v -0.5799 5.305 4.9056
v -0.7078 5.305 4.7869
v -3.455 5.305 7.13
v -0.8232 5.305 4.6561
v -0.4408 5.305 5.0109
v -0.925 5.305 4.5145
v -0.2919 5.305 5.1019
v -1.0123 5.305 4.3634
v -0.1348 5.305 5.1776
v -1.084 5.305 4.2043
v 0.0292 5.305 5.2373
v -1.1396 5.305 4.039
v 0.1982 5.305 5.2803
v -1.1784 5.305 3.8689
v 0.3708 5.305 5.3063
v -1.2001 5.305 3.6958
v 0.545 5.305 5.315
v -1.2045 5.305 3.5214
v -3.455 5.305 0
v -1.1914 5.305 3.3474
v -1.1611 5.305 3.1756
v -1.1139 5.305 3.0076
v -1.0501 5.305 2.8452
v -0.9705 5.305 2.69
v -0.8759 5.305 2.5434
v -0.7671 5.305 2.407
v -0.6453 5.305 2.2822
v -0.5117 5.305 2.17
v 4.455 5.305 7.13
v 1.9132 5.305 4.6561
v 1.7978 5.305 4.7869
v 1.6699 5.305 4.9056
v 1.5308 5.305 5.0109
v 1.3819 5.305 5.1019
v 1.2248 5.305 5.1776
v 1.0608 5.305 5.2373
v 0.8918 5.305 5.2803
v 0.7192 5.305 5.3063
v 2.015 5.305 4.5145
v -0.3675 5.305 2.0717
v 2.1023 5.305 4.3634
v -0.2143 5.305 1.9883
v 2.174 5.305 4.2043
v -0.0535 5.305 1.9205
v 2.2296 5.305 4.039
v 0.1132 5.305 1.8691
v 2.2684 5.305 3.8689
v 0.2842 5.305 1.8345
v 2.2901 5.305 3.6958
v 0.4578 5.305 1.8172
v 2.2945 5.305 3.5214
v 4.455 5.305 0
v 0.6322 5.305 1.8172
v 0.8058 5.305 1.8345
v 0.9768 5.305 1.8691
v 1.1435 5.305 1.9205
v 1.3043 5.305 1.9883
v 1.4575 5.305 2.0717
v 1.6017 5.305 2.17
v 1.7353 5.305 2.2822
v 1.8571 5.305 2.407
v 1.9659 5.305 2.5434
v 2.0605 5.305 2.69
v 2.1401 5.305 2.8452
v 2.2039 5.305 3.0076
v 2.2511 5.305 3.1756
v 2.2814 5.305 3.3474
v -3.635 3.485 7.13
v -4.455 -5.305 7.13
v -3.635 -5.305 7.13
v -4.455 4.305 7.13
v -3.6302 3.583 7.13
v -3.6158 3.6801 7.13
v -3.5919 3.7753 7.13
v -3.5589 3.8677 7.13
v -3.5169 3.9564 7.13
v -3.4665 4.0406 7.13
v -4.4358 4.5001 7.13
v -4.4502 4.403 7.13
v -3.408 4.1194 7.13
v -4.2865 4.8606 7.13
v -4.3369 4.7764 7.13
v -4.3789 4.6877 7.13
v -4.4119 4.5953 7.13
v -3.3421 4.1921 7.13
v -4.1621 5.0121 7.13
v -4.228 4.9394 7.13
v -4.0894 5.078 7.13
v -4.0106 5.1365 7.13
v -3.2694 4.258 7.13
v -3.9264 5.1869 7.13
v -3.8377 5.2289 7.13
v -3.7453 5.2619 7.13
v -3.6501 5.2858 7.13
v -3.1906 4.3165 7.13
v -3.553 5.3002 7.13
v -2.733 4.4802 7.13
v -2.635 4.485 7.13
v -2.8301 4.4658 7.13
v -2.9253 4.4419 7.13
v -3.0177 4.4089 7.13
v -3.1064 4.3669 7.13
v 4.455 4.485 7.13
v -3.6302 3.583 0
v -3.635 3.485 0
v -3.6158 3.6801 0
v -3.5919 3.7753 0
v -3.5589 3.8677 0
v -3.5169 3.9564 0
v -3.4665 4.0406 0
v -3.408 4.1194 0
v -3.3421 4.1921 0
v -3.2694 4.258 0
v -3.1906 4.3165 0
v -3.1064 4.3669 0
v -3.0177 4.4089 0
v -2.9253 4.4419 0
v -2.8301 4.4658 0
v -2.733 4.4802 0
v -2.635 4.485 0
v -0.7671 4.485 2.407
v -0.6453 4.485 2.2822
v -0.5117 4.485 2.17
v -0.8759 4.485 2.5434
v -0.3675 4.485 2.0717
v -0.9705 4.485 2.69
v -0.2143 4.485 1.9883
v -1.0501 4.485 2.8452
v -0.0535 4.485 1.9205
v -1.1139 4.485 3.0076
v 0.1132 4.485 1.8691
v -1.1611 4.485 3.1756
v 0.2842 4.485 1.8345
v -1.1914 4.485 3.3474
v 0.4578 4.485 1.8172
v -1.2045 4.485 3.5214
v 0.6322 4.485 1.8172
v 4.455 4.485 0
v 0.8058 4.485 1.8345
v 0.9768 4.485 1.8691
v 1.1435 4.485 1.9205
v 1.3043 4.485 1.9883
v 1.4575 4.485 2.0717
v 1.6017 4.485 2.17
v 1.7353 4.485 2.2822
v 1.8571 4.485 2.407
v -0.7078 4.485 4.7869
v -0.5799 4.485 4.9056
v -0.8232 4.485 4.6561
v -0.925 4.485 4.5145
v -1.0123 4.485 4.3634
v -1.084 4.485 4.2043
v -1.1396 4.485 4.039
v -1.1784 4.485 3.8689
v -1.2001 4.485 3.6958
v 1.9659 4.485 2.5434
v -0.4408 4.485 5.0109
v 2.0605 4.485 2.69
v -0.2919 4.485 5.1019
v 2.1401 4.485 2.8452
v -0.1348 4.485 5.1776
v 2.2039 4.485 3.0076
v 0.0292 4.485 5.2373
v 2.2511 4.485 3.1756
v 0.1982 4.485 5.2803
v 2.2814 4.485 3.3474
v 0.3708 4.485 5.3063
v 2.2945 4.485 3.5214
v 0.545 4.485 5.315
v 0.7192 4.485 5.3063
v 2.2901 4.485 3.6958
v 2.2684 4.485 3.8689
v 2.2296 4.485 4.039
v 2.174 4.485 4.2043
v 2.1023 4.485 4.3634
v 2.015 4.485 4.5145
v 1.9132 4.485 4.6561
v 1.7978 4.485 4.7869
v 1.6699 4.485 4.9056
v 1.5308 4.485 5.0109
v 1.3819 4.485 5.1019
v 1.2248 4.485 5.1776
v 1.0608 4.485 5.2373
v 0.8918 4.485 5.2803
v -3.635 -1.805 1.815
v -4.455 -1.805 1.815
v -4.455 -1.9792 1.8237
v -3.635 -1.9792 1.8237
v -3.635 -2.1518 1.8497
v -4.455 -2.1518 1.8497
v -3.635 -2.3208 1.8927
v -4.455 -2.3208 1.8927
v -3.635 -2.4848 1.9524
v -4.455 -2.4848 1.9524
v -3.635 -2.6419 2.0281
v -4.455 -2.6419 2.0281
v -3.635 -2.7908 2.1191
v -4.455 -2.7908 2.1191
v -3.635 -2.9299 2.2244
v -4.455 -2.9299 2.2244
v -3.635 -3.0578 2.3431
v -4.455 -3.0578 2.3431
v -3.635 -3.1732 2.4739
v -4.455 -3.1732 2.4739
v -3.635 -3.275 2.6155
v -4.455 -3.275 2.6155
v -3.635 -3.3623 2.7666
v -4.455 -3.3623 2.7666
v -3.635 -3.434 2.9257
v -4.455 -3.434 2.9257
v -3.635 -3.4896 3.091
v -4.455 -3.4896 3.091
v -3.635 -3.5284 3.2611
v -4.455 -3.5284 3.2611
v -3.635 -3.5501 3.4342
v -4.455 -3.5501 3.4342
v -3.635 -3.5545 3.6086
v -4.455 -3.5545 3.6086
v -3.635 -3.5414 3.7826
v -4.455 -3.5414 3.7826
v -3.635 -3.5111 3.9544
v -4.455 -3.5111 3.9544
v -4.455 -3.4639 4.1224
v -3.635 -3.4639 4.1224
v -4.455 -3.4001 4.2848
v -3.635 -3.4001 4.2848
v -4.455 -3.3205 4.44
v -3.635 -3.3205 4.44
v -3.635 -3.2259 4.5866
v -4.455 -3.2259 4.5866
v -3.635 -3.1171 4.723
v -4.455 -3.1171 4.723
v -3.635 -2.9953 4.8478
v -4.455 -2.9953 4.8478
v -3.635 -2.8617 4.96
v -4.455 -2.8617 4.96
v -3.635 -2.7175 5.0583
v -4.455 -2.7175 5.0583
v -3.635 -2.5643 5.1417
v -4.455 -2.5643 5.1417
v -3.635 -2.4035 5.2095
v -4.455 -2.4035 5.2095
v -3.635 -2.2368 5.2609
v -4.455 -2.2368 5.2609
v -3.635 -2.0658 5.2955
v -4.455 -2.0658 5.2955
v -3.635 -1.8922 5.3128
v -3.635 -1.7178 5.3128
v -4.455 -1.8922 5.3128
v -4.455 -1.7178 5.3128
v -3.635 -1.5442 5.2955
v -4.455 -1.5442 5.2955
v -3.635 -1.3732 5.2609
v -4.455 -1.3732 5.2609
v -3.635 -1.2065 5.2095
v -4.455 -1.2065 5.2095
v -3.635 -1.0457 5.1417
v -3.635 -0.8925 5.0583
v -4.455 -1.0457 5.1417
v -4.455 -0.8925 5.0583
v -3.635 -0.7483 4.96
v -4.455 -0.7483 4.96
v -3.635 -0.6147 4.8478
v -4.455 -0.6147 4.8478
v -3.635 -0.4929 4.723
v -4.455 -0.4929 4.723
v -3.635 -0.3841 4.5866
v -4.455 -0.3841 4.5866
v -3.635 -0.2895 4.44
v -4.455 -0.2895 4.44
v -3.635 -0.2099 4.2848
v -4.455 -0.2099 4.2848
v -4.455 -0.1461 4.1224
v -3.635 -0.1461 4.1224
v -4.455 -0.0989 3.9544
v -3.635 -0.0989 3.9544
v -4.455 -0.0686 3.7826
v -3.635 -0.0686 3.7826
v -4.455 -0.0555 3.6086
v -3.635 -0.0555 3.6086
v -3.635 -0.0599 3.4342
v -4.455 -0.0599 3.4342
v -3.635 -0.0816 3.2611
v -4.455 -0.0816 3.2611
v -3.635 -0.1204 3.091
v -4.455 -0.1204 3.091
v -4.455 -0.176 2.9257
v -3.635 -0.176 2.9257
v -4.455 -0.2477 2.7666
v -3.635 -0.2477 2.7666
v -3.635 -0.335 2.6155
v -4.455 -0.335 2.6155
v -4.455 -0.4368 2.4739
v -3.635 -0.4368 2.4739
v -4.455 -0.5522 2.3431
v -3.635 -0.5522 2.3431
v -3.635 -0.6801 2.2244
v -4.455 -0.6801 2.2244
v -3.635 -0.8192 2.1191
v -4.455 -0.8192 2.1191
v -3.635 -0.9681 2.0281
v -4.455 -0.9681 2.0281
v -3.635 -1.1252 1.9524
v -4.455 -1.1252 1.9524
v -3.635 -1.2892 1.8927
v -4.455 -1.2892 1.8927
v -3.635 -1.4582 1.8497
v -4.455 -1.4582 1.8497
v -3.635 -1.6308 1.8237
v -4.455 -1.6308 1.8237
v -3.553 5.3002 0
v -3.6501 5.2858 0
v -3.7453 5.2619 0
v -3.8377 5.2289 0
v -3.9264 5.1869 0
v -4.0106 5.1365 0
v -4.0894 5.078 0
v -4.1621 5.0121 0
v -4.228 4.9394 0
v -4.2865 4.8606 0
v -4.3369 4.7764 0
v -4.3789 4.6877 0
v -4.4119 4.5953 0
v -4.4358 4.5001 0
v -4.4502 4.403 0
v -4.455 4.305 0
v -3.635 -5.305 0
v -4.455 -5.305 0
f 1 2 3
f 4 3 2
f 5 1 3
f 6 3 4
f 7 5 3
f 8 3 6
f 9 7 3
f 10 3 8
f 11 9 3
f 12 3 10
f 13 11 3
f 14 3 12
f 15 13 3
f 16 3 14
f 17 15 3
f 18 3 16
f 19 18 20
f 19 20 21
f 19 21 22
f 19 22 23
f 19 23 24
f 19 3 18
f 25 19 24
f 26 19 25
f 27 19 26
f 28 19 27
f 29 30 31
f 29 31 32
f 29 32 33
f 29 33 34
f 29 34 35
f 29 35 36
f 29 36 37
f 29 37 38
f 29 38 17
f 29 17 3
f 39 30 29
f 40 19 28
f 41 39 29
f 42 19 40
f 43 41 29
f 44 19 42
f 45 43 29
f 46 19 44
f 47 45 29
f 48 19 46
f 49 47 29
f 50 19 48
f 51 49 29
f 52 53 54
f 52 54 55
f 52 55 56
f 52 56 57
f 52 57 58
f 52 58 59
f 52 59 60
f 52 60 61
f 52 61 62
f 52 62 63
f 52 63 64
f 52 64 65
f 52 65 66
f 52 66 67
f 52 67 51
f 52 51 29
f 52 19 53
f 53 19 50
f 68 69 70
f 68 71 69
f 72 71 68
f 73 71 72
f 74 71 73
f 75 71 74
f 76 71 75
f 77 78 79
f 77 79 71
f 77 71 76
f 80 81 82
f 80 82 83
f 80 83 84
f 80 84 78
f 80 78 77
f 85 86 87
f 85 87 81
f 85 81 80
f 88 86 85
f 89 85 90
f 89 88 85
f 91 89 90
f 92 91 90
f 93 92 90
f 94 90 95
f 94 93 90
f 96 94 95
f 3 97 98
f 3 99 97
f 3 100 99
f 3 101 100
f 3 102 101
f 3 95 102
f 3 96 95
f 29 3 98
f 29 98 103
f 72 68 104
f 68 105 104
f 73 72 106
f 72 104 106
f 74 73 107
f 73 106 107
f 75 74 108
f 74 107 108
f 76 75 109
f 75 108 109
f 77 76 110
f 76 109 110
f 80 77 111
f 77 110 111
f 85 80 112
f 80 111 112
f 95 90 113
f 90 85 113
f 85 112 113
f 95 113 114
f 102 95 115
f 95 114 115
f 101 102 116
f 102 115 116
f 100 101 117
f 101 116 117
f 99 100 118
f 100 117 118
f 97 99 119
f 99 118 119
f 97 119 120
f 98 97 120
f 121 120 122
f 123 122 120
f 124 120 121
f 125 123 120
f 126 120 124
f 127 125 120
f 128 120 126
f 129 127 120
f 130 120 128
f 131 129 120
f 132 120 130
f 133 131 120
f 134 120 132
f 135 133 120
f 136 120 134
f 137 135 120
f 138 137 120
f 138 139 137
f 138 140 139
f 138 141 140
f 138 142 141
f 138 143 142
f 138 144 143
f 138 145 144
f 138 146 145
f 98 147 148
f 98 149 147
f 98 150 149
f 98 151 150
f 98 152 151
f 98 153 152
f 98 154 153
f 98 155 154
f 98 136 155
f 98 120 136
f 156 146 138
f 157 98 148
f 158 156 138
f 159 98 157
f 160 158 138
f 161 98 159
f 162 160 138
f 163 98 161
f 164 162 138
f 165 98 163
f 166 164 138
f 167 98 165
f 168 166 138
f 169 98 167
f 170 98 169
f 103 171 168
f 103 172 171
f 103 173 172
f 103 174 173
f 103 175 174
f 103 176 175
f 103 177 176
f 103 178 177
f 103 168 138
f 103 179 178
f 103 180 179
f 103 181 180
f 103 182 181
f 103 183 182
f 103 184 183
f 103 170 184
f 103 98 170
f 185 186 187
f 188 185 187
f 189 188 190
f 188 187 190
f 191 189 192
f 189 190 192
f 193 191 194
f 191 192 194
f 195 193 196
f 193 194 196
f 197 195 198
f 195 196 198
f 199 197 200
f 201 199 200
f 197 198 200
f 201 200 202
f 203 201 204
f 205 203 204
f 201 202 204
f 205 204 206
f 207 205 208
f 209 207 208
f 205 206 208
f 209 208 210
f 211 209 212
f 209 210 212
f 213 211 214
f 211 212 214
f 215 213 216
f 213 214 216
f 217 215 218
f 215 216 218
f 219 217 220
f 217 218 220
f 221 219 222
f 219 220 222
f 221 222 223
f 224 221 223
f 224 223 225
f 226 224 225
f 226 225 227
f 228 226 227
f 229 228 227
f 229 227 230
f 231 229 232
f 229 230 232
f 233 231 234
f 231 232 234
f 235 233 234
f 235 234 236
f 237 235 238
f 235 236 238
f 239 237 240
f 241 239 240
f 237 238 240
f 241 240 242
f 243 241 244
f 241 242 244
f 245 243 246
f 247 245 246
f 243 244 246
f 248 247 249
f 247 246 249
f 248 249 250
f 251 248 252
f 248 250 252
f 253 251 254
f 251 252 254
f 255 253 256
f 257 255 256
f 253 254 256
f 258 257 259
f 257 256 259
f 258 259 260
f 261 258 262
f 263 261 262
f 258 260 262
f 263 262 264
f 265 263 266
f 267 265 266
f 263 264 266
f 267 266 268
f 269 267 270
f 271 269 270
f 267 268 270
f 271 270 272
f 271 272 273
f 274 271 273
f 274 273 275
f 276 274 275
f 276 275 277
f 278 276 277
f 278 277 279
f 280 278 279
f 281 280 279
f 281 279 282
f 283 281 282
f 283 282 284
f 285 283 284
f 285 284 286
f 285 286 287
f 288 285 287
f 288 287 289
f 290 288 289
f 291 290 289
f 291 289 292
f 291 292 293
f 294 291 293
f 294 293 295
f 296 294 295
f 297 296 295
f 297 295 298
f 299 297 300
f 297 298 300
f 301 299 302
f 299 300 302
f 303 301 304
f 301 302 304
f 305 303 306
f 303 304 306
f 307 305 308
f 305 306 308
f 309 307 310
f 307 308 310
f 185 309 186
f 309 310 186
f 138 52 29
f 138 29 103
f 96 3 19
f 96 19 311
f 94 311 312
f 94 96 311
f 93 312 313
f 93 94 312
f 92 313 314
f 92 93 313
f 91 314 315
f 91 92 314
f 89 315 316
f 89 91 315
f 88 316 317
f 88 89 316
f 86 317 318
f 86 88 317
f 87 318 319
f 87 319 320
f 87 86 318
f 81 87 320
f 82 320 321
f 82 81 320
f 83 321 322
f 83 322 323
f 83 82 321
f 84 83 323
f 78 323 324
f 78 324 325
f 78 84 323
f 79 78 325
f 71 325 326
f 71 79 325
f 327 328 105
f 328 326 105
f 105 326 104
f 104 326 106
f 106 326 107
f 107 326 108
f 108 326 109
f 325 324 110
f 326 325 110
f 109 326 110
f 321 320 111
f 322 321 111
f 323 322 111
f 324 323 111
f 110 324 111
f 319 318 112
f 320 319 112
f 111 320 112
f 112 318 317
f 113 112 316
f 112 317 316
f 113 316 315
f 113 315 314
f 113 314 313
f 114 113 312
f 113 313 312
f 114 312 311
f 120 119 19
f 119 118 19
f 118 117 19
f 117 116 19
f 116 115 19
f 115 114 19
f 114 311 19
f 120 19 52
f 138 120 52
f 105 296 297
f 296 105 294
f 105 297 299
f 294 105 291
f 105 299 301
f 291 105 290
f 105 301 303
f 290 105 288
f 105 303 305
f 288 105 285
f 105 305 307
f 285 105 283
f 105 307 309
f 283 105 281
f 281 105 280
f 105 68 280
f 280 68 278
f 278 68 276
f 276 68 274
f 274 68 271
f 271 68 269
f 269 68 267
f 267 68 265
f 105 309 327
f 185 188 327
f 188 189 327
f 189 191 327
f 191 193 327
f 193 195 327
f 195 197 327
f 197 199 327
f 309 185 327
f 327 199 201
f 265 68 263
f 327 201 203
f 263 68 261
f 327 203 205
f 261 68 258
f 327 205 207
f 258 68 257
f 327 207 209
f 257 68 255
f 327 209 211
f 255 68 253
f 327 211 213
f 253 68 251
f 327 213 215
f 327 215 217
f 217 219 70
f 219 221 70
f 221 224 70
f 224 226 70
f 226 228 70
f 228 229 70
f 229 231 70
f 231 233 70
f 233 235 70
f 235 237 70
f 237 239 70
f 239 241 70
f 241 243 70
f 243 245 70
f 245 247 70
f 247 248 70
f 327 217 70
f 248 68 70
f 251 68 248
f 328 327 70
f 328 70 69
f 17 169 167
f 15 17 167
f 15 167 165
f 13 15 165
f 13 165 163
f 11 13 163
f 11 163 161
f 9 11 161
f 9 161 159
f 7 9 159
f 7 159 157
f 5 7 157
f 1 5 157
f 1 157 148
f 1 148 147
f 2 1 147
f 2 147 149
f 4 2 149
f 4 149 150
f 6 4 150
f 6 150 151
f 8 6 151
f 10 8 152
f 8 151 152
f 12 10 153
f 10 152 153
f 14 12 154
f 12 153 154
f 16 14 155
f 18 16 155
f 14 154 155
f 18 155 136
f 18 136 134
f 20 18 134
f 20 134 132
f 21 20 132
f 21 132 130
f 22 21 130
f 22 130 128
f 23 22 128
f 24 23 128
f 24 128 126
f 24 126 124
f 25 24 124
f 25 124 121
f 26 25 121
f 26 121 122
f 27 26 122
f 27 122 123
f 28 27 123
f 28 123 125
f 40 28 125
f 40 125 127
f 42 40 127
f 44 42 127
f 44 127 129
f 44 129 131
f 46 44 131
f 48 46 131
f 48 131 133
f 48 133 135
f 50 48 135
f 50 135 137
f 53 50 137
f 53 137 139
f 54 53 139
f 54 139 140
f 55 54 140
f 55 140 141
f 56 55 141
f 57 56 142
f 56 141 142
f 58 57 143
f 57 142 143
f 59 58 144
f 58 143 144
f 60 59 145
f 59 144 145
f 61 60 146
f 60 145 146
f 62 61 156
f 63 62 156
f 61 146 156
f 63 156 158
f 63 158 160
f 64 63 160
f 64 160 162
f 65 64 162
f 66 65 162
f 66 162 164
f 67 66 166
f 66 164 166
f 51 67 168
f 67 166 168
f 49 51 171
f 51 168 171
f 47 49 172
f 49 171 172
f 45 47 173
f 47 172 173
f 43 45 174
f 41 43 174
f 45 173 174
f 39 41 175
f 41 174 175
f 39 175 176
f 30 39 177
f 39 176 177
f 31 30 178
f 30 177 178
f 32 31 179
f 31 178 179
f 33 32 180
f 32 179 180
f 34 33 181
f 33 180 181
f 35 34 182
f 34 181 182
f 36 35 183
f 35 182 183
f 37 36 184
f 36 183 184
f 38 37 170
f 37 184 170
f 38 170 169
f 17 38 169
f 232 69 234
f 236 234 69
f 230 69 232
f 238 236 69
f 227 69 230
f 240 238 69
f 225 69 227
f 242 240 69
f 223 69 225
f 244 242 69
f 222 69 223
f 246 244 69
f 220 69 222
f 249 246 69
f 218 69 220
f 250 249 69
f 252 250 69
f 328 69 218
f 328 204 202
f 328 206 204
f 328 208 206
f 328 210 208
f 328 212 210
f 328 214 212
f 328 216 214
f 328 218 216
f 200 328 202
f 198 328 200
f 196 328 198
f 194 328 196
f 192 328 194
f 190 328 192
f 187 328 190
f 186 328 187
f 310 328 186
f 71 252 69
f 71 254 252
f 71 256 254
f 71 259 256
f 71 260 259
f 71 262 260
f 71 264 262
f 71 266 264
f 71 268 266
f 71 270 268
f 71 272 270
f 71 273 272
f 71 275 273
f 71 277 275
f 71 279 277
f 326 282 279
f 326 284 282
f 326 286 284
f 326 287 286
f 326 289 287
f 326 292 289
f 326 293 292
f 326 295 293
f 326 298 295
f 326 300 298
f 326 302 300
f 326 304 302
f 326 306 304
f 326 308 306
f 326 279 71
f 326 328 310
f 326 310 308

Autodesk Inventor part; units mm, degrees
ref_plane "YZ Plane" through (0, 0, 0) normal (1, 0, 0) x (0, 1, 0)
ref_plane "XZ Plane" through (0, 0, 0) normal (0, 1, 0) x (-1, 0, 0)
ref_plane "XY Plane" through (0, 0, 0) normal (0, 0, 1) x (1, 0, 0)
sketch "Sketch1" plane through (0, 0, 0) normal (0, 0, 1) x (1, 0, 0)
  line L0 (-4.455, 5.305) -> (4.455, 5.305)
  line L1 (4.455, 5.305) -> (4.455, -5.305)
  line L2 (4.455, -5.305) -> (-4.455, -5.305)
  line L3 (-4.455, -5.305) -> (-4.455, 5.305)
  line L4 (-6.237, 0) -> (6.237, 0) projected
  line L5 (0, -7.427) -> (0, 7.427) projected
  point P0 (0, 0)
  dimension "d0" = 8.91
  dimension "d1" = 10.61
  dimension "d2" = 4.455
  dimension "d3" = 5.305
extrude "BraketBase" add sketch "Sketch1" along normal blind 7.13
sketch "Sketch2" plane through (0, 0, 7.13) normal (0, 0, 1) x (1, 0, 0)
  line L0 (4.455, 5.305) -> (-4.455, 5.305) projected
  line L1 (-4.455, 5.305) -> (-4.455, -5.305) projected
  line L2 (-4.455, -5.305) -> (4.455, -5.305) projected
  line L3 (4.455, -5.305) -> (4.455, 5.305) projected
  line L4 (-3.635, 4.485) -> (4.455, 4.485)
  line L5 (-3.635, 4.485) -> (-3.635, -5.305)
  line L6 (-4.455, -5.305) -> (4.455, -5.305) projected
  line L7 (-3.635, 4.485) -> (4.455, 4.485)
  line L8 (4.455, 4.485) -> (4.455, -5.305)
  line L9 (4.455, -5.305) -> (-3.635, -5.305)
  line L10 (-3.635, -5.305) -> (-3.635, 4.485)
  point P0 (0, 0)
  dimension "d6" = 0.82
  dimension "d7" = 0.82
extrude "BraketCut" cut sketch "Sketch2" against normal blind 7.13 contours L3 L2 L5 L4
sketch "Sketch3" plane through (-4.455, 5.305, 0) normal (0, 1, 0) x (1, 0, 0)
  line L0 (0, 0) -> (8.91, 0) projected
  line L1 (0, 0) -> (0, -7.13) projected
  line L2 (8.91, -7.13) -> (0, -7.13) projected
  line L3 (8.91, 0) -> (8.91, -7.13) projected
  circle A0 centre (5, -3.565) radius 1.75
  point P0 (4.455, 0)
  dimension "d10" = 3.5
  dimension "d11" = 5
  dimension "d12" = 3.565
hole "ShortHole" at (0.545, 5.305, 3.565) direction (0, -1, 0) diameter 3.5 end through all
sketch "Sketch4" plane through (-3.635, -5.305, 7.13) normal (1, 0, 0) x (0, 0, -1)
  line L0 (0, 0) -> (0, 9.79) projected
  line L1 (7.13, 0) -> (0, 0) projected
  line L2 (7.13, 9.79) -> (7.13, 0) projected
  line L3 (0, 9.79) -> (7.13, 9.79) projected
  circle A0 centre (3.565, 3.5) radius 1.75
  point P0 (7.13, 5.305)
  dimension "d20" = 3.5
  dimension "d21" = 3.5
  dimension "d22" = 3.565
hole "LongHole" at (-3.635, -1.805, 3.565) direction (-1, 0, 0) diameter 3.5 end through all
fillet "Fillet1" radius 1 2 edges at (-4.455, 5.305, 3.565) (-3.635, 4.485, 3.565)
equation "\"d2\" = 0.5 * d0"
equation "\"d3\" = 0.5 * d1"
equation "\"d7\" = d6"
properties part number "LBracket"
